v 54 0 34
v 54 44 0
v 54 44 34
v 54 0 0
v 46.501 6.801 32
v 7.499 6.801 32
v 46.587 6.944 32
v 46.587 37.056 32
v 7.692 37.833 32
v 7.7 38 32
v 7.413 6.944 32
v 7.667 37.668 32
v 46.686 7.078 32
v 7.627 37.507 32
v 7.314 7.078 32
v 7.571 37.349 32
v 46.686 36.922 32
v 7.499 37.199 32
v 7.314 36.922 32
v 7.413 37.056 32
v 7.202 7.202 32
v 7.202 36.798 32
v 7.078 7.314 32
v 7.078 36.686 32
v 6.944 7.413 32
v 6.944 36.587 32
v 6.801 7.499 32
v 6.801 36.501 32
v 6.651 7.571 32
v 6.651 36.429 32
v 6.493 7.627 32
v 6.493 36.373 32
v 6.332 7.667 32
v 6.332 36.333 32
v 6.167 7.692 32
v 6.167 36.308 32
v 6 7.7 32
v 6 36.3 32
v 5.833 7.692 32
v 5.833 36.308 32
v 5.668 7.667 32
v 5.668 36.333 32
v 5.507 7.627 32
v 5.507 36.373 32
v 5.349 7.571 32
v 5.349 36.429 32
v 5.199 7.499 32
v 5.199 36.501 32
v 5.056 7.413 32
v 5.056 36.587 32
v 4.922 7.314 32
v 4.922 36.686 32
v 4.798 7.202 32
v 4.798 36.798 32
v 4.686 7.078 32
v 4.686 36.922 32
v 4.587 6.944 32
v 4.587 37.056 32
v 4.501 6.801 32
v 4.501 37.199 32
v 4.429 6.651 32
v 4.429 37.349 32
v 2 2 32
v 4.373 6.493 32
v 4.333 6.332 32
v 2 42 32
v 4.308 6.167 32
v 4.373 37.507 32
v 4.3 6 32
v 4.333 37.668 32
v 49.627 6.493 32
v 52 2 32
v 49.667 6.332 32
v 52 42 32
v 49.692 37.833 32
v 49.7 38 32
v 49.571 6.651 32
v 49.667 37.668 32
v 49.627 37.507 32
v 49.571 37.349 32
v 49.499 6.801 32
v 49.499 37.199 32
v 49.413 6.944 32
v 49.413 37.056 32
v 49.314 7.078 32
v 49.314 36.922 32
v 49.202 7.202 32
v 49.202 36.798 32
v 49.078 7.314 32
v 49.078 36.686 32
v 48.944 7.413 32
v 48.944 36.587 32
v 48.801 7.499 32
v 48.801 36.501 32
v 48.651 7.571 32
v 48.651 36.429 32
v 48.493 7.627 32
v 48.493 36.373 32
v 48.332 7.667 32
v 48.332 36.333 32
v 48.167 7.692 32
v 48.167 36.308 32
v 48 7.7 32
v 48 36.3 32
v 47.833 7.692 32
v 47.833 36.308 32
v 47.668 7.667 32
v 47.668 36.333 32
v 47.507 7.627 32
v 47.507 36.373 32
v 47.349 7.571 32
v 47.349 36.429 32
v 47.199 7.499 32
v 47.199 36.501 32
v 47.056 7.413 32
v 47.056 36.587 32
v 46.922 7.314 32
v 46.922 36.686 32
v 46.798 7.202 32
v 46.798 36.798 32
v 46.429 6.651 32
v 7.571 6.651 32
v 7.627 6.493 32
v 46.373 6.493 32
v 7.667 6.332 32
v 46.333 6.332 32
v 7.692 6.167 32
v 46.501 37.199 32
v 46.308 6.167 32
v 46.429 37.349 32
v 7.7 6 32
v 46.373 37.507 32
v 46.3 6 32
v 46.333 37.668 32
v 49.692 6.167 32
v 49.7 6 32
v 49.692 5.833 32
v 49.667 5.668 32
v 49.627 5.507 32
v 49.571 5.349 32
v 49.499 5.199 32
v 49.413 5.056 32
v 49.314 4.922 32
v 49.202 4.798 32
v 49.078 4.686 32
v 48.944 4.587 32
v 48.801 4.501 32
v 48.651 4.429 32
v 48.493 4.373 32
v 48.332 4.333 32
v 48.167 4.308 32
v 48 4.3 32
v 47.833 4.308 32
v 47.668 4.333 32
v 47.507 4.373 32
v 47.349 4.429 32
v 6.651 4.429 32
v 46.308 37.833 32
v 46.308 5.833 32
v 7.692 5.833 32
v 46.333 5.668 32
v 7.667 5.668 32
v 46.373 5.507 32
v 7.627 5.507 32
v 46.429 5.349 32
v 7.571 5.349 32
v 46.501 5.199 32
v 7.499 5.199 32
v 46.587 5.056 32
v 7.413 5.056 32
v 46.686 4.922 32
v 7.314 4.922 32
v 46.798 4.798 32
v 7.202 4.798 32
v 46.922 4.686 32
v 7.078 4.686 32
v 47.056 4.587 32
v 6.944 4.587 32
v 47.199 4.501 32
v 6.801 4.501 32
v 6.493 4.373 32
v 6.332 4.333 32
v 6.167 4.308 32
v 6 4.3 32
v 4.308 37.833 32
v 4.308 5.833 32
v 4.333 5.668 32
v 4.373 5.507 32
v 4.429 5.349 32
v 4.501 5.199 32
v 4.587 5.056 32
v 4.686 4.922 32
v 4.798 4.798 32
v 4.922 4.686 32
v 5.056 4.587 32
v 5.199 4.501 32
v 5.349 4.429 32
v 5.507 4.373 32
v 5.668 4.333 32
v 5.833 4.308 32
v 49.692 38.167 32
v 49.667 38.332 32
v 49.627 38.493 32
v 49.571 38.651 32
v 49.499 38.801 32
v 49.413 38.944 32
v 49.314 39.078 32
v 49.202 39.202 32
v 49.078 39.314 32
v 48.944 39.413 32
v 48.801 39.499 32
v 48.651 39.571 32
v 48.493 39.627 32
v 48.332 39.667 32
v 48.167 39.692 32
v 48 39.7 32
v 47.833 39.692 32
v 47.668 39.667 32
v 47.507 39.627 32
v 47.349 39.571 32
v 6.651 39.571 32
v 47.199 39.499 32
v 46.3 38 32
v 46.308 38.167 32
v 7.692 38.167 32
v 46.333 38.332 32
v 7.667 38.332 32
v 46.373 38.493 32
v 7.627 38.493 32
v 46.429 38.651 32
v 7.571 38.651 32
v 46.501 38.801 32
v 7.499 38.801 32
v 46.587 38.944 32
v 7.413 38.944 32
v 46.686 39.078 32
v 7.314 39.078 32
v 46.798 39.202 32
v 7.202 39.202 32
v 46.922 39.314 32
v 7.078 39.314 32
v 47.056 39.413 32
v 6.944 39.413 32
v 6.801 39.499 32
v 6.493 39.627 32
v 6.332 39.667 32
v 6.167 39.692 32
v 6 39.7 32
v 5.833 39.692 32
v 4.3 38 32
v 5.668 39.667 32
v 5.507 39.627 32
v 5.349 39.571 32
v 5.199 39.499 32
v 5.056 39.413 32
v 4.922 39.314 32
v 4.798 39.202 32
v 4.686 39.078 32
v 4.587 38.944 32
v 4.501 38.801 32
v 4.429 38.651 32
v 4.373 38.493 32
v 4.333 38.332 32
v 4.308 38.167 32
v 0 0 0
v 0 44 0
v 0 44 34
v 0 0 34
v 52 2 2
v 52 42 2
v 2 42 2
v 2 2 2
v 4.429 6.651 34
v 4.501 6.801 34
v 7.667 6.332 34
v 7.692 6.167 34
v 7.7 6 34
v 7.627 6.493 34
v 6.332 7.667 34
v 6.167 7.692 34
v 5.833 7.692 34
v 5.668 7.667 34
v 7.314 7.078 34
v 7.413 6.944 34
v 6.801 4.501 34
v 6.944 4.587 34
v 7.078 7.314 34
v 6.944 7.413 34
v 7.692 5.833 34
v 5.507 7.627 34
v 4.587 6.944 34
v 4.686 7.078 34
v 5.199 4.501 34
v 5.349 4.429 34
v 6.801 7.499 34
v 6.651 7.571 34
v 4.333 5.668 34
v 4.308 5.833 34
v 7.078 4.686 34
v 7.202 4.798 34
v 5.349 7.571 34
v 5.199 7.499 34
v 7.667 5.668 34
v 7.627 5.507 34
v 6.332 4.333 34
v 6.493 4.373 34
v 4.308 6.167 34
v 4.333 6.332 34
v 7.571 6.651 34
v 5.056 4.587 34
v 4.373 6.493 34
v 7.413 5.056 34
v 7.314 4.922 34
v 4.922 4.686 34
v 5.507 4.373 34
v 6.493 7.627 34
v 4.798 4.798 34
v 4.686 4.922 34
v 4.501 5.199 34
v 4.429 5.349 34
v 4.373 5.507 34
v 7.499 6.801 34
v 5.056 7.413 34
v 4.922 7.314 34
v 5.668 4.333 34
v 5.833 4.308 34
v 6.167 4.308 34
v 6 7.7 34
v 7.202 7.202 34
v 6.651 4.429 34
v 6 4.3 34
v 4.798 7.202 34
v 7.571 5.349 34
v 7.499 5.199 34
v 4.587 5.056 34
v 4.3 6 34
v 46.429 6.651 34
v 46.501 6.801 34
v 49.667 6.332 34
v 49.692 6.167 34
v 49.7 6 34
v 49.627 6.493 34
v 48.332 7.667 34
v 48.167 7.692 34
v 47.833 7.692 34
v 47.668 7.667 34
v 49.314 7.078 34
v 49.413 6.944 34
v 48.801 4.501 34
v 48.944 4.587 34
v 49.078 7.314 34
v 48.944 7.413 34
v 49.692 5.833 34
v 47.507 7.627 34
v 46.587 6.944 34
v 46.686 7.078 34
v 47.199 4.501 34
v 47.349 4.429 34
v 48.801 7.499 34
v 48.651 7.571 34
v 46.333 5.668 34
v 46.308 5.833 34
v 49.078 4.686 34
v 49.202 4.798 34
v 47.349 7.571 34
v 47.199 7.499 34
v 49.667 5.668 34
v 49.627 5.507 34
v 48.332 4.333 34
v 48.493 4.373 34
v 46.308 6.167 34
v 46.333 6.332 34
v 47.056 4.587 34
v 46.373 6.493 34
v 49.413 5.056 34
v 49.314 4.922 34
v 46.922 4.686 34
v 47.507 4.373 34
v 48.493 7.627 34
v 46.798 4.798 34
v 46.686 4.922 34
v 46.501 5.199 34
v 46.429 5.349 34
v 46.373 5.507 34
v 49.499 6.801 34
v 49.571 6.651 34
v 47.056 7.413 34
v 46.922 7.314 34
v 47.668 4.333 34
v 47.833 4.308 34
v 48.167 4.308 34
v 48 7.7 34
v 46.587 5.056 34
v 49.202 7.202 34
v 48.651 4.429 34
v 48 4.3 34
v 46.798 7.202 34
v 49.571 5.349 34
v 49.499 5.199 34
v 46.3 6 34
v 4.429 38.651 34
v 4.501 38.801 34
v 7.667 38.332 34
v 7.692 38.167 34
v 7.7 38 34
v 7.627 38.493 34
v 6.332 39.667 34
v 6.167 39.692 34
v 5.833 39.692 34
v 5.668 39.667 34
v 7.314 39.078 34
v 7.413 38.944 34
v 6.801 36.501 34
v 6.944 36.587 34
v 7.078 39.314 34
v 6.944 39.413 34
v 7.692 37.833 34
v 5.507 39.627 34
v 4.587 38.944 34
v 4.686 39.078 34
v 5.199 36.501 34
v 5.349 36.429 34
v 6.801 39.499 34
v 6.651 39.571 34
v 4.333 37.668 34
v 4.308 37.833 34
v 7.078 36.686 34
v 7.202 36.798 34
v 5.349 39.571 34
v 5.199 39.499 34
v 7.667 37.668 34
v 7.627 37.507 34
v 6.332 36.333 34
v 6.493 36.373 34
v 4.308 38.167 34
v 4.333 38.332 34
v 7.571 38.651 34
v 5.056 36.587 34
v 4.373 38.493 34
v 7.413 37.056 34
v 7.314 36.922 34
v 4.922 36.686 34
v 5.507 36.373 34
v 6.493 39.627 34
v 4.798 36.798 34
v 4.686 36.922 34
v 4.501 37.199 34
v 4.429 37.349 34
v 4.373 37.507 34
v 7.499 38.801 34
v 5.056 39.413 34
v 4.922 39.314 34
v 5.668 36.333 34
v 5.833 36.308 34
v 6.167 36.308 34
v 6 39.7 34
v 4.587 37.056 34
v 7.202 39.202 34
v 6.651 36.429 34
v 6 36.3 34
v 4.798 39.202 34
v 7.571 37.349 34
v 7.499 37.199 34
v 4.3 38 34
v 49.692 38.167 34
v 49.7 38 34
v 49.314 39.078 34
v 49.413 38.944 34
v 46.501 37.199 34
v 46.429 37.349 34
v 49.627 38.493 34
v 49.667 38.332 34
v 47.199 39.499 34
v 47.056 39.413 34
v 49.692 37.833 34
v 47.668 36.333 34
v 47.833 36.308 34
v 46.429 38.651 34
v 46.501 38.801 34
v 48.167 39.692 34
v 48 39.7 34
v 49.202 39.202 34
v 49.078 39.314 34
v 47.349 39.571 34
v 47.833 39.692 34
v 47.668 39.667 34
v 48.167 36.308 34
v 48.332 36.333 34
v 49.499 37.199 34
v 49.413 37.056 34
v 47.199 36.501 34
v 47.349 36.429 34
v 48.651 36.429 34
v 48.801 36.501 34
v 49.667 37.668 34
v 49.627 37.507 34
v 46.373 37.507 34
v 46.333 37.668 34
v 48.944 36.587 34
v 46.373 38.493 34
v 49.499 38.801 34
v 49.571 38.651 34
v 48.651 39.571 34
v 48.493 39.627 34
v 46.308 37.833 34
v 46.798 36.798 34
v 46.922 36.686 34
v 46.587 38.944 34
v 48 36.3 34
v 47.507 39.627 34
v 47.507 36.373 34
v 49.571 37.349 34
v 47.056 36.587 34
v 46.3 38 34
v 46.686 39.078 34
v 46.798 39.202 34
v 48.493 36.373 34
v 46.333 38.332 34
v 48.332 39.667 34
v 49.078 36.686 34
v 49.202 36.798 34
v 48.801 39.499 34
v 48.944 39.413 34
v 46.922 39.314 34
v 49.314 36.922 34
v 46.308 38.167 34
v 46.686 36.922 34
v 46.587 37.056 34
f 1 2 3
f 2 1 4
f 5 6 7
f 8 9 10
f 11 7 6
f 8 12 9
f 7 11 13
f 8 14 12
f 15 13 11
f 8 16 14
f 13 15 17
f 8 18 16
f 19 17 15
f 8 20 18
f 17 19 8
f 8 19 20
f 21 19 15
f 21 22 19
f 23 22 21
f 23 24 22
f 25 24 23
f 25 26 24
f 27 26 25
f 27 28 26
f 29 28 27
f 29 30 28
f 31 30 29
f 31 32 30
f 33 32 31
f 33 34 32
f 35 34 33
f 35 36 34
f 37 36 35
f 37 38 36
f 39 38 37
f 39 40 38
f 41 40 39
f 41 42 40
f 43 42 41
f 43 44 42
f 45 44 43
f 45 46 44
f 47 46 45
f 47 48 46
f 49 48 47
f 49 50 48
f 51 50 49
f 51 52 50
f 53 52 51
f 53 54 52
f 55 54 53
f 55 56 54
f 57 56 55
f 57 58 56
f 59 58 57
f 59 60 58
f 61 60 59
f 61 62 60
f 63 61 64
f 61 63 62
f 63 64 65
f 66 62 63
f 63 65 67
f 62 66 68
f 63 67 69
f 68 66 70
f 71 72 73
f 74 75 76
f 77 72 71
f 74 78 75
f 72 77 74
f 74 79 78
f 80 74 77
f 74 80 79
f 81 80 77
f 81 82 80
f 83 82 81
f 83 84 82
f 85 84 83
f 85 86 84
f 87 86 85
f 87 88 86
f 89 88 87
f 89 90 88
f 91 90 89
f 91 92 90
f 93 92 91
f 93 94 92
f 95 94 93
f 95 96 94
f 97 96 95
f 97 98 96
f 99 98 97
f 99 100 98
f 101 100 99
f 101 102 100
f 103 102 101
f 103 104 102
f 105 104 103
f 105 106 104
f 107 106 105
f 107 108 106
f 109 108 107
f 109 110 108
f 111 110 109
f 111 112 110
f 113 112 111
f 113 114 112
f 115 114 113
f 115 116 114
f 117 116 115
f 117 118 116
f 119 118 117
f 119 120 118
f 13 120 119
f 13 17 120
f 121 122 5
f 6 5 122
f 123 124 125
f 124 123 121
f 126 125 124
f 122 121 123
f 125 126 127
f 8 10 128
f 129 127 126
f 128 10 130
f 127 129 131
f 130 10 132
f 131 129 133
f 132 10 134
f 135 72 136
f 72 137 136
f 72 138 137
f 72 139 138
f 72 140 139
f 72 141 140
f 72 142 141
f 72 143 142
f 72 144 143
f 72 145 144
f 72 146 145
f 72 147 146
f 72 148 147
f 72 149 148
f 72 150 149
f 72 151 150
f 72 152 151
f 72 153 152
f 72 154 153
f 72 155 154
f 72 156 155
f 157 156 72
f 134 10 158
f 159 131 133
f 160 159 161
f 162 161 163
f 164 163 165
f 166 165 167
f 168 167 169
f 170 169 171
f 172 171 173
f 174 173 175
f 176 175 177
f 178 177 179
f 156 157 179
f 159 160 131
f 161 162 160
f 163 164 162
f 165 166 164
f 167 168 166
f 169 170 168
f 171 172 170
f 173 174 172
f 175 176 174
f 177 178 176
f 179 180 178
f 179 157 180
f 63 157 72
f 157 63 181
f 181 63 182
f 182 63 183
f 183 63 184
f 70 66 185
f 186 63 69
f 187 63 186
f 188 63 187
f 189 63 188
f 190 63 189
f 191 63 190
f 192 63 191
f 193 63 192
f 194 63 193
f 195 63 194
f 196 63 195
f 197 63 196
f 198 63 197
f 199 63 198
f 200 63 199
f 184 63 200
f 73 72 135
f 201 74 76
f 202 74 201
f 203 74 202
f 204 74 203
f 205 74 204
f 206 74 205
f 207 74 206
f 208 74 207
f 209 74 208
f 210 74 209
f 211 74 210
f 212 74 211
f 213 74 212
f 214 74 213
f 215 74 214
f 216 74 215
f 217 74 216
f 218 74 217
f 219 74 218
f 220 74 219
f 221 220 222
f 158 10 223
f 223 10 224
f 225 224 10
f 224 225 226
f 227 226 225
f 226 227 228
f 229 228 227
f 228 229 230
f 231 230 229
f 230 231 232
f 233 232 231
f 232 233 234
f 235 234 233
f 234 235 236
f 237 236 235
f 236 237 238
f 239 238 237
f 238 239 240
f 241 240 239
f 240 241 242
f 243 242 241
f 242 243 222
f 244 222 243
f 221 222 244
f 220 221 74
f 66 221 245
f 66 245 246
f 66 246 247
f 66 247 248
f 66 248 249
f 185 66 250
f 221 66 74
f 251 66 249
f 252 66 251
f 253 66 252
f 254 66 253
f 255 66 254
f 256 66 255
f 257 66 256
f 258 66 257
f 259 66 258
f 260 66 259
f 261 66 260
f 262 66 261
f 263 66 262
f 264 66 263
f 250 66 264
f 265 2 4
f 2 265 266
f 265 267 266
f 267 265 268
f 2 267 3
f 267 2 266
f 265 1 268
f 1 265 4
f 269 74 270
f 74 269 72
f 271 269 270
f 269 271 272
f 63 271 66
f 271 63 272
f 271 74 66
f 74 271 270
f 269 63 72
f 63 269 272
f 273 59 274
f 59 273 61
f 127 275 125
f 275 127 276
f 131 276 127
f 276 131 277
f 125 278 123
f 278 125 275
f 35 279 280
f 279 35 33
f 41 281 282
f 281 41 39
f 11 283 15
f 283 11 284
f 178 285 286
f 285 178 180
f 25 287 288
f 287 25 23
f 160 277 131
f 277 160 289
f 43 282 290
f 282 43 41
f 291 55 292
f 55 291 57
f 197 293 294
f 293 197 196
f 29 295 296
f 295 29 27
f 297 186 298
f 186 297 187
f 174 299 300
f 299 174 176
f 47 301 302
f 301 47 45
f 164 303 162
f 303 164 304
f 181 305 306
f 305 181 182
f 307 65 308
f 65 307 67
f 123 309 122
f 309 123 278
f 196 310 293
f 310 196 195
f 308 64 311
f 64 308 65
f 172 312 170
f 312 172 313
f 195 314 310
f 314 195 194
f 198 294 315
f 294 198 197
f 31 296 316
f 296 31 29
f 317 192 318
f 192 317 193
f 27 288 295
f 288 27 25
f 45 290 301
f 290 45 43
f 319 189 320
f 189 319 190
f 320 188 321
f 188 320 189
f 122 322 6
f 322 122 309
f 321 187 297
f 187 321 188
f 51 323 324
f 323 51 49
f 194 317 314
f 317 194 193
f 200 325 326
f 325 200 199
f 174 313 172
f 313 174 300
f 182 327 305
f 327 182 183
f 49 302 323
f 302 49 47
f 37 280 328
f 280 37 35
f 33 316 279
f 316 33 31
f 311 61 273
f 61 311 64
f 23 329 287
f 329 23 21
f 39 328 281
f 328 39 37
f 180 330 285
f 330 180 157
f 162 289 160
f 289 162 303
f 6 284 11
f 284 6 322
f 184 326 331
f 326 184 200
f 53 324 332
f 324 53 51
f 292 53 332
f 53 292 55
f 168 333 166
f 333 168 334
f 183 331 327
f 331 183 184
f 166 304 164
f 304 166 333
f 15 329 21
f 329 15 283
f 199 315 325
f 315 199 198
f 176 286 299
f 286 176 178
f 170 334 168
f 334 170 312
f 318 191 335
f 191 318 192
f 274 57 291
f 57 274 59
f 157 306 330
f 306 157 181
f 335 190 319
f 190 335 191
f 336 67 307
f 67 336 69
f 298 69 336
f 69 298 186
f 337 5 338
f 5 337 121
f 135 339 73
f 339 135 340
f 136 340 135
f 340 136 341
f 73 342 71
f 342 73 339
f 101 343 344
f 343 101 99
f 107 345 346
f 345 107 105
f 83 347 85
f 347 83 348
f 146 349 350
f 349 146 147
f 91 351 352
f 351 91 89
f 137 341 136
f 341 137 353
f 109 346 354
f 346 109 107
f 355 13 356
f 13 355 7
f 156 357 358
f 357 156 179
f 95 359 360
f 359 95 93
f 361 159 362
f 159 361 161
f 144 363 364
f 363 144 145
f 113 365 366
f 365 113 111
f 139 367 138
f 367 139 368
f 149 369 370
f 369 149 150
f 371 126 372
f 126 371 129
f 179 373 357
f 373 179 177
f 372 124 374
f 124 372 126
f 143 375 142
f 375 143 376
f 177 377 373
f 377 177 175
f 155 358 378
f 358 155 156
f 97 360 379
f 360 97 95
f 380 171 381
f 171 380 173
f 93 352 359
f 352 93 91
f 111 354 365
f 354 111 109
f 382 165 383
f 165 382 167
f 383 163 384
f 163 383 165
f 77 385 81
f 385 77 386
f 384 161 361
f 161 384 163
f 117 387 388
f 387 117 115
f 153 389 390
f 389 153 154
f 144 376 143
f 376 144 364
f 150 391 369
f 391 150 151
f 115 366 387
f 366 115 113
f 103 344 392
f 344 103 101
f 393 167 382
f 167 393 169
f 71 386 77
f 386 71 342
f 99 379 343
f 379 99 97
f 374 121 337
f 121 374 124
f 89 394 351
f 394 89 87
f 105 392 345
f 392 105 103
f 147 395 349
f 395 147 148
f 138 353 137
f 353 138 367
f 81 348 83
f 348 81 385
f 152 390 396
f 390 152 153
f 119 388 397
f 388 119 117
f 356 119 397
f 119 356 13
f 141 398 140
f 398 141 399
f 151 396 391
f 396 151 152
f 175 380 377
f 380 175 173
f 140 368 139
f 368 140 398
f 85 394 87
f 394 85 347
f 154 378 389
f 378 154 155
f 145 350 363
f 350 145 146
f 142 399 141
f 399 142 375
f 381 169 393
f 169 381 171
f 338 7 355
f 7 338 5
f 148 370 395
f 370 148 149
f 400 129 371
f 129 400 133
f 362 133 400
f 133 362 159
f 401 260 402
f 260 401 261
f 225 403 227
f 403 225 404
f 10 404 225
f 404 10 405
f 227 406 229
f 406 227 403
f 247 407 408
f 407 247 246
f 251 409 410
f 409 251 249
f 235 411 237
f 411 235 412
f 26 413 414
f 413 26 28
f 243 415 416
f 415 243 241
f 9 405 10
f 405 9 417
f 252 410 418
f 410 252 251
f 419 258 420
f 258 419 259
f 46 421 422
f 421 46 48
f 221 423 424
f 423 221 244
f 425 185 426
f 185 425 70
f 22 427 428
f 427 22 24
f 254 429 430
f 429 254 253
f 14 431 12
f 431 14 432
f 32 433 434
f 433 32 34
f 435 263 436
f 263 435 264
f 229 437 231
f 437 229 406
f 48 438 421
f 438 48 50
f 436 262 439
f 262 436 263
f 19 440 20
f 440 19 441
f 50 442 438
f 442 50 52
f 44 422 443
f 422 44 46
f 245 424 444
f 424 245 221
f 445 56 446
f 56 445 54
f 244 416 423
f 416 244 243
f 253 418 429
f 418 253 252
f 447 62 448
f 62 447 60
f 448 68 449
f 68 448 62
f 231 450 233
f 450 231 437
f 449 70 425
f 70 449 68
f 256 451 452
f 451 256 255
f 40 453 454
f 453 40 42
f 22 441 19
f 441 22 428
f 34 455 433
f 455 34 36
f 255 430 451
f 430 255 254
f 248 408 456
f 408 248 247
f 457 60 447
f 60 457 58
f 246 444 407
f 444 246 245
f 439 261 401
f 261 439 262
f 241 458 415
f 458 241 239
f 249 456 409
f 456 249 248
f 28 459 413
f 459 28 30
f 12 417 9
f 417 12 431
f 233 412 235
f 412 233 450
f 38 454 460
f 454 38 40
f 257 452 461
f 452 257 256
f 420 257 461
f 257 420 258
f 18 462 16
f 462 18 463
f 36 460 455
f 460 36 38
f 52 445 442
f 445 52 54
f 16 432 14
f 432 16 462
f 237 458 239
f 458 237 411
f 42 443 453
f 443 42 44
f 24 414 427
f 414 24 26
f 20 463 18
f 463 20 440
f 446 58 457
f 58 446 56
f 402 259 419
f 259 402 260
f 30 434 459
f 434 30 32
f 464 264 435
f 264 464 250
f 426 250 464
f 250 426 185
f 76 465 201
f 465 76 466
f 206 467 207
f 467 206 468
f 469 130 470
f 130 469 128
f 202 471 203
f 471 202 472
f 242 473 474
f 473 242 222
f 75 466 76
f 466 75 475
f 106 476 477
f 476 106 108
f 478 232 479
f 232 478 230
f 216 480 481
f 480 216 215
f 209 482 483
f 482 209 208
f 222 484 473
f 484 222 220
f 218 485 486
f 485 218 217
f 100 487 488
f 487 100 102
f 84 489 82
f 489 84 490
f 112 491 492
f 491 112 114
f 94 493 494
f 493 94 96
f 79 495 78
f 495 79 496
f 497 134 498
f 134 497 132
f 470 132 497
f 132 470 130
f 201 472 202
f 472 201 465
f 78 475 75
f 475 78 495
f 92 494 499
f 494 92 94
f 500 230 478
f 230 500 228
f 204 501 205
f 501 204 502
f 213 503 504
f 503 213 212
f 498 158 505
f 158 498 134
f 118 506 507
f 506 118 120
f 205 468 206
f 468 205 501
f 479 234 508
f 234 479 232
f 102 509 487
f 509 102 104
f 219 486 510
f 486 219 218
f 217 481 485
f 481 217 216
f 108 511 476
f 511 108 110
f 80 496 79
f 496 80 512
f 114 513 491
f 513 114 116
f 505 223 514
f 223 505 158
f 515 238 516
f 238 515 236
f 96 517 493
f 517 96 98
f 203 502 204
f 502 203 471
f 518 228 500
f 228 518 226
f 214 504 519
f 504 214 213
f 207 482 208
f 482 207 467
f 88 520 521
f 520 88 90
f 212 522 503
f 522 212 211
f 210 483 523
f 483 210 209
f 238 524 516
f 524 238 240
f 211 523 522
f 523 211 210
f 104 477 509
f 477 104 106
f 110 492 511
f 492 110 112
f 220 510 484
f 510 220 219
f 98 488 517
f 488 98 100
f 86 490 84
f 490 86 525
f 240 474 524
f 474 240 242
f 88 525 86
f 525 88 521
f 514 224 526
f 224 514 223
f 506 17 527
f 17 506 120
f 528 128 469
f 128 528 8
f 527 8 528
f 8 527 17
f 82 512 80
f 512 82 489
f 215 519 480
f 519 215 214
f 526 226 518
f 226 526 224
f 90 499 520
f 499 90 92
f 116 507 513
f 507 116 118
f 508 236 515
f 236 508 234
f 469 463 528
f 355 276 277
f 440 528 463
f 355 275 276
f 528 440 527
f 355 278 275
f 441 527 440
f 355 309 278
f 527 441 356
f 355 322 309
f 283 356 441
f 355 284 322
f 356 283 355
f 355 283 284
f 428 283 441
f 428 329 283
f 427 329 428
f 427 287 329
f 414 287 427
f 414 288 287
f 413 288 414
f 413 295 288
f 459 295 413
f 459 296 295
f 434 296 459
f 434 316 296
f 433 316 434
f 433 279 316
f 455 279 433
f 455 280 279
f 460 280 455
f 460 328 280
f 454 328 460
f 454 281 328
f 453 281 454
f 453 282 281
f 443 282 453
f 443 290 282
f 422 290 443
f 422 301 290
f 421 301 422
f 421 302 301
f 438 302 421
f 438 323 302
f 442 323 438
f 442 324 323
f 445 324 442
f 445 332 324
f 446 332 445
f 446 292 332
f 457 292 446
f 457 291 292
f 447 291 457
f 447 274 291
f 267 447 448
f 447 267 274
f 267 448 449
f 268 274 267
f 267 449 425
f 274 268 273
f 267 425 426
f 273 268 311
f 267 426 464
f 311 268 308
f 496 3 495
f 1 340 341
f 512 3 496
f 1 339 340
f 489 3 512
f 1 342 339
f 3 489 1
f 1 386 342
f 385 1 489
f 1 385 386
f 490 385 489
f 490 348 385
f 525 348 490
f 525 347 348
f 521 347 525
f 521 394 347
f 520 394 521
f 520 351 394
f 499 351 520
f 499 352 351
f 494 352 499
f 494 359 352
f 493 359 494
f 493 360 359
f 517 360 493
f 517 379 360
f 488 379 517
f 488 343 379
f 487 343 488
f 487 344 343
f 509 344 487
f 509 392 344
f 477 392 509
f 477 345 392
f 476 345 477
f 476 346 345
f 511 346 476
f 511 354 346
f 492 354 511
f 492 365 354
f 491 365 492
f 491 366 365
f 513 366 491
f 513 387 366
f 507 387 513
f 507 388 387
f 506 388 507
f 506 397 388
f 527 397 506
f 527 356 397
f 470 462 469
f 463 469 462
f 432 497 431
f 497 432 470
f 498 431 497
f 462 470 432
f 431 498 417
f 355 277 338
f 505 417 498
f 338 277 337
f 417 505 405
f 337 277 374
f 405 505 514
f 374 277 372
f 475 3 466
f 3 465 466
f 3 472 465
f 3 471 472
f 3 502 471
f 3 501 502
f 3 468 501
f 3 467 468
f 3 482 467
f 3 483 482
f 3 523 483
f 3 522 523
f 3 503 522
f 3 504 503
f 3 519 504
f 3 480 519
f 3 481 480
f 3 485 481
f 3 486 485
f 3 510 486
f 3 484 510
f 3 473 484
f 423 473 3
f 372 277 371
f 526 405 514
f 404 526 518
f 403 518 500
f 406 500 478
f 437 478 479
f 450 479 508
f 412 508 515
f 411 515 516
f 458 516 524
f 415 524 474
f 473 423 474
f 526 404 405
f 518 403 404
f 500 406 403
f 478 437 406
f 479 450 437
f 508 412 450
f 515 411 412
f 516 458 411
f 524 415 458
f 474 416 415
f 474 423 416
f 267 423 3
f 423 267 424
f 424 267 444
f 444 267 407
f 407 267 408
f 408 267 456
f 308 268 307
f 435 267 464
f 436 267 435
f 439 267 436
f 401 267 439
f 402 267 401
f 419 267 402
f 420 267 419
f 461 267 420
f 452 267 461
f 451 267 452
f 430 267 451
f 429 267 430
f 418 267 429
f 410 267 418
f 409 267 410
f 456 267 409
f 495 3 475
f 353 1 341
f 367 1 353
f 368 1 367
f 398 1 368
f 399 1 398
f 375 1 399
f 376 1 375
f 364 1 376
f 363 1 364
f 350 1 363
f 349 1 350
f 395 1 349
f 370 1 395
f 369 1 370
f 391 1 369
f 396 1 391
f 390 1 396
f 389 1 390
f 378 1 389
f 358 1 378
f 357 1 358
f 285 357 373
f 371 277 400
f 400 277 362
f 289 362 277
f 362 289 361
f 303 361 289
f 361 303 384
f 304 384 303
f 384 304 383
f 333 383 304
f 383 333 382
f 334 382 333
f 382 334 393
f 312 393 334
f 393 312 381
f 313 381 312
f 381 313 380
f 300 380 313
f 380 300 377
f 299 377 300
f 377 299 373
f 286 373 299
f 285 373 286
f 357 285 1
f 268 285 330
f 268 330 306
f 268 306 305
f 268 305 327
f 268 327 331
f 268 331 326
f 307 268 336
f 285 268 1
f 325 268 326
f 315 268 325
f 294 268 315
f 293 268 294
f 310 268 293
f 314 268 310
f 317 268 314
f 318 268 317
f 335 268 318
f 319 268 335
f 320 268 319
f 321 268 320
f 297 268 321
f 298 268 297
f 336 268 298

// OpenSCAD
$fn = 64;

// Enclosure parameters (mm)
cavity_x = 50;
cavity_y = 40;
cavity_z = 30;
wall = 2.0;

base_outer_x = cavity_x + 2 * wall;
base_outer_y = cavity_y + 2 * wall;
base_height = cavity_z + wall;     // 2 mm floor + 30 mm interior height
lid_height = wall;                 // lid wall thickness

// Fastener geometry
screw_clearance_d = 3.4;          // M3 clearance through lid
insert_bore_d = 5.0;              // heat-set insert bore
insert_depth = 6.0;

// One near each corner (corner offset from outer faces)
corner_offset = 6.0;
corner_points = [
    [corner_offset, corner_offset],
    [base_outer_x - corner_offset, corner_offset],
    [corner_offset, base_outer_y - corner_offset],
    [base_outer_x - corner_offset, base_outer_y - corner_offset]
];

module base_part() {
    difference() {
        // Base shell
        cube([base_outer_x, base_outer_y, base_height]);

        // Internal cavity: 50 x 40 x 30
        translate([wall, wall, wall])
            cube([cavity_x, cavity_y, cavity_z]);

        // Heat-set insert bores in the base, aligned to lid axes
        for (p = corner_points) {
            translate([p[0], p[1], base_height - insert_depth])
                cylinder(h = insert_depth + 0.001, d = insert_bore_d);
        }
    }
}

module lid_part() {
    difference() {
        // Lid body
        cube([base_outer_x, base_outer_y, lid_height]);

        // M3 clearance holes through lid
        for (p = corner_points) {
            translate([p[0], p[1], -0.001])
                cylinder(h = lid_height + 0.002, d = screw_clearance_d);
        }
    }
}

// Render assembled positions, non-intersecting (touching only at interface plane)
base_part();
translate([0, 0, base_height]) lid_part();
